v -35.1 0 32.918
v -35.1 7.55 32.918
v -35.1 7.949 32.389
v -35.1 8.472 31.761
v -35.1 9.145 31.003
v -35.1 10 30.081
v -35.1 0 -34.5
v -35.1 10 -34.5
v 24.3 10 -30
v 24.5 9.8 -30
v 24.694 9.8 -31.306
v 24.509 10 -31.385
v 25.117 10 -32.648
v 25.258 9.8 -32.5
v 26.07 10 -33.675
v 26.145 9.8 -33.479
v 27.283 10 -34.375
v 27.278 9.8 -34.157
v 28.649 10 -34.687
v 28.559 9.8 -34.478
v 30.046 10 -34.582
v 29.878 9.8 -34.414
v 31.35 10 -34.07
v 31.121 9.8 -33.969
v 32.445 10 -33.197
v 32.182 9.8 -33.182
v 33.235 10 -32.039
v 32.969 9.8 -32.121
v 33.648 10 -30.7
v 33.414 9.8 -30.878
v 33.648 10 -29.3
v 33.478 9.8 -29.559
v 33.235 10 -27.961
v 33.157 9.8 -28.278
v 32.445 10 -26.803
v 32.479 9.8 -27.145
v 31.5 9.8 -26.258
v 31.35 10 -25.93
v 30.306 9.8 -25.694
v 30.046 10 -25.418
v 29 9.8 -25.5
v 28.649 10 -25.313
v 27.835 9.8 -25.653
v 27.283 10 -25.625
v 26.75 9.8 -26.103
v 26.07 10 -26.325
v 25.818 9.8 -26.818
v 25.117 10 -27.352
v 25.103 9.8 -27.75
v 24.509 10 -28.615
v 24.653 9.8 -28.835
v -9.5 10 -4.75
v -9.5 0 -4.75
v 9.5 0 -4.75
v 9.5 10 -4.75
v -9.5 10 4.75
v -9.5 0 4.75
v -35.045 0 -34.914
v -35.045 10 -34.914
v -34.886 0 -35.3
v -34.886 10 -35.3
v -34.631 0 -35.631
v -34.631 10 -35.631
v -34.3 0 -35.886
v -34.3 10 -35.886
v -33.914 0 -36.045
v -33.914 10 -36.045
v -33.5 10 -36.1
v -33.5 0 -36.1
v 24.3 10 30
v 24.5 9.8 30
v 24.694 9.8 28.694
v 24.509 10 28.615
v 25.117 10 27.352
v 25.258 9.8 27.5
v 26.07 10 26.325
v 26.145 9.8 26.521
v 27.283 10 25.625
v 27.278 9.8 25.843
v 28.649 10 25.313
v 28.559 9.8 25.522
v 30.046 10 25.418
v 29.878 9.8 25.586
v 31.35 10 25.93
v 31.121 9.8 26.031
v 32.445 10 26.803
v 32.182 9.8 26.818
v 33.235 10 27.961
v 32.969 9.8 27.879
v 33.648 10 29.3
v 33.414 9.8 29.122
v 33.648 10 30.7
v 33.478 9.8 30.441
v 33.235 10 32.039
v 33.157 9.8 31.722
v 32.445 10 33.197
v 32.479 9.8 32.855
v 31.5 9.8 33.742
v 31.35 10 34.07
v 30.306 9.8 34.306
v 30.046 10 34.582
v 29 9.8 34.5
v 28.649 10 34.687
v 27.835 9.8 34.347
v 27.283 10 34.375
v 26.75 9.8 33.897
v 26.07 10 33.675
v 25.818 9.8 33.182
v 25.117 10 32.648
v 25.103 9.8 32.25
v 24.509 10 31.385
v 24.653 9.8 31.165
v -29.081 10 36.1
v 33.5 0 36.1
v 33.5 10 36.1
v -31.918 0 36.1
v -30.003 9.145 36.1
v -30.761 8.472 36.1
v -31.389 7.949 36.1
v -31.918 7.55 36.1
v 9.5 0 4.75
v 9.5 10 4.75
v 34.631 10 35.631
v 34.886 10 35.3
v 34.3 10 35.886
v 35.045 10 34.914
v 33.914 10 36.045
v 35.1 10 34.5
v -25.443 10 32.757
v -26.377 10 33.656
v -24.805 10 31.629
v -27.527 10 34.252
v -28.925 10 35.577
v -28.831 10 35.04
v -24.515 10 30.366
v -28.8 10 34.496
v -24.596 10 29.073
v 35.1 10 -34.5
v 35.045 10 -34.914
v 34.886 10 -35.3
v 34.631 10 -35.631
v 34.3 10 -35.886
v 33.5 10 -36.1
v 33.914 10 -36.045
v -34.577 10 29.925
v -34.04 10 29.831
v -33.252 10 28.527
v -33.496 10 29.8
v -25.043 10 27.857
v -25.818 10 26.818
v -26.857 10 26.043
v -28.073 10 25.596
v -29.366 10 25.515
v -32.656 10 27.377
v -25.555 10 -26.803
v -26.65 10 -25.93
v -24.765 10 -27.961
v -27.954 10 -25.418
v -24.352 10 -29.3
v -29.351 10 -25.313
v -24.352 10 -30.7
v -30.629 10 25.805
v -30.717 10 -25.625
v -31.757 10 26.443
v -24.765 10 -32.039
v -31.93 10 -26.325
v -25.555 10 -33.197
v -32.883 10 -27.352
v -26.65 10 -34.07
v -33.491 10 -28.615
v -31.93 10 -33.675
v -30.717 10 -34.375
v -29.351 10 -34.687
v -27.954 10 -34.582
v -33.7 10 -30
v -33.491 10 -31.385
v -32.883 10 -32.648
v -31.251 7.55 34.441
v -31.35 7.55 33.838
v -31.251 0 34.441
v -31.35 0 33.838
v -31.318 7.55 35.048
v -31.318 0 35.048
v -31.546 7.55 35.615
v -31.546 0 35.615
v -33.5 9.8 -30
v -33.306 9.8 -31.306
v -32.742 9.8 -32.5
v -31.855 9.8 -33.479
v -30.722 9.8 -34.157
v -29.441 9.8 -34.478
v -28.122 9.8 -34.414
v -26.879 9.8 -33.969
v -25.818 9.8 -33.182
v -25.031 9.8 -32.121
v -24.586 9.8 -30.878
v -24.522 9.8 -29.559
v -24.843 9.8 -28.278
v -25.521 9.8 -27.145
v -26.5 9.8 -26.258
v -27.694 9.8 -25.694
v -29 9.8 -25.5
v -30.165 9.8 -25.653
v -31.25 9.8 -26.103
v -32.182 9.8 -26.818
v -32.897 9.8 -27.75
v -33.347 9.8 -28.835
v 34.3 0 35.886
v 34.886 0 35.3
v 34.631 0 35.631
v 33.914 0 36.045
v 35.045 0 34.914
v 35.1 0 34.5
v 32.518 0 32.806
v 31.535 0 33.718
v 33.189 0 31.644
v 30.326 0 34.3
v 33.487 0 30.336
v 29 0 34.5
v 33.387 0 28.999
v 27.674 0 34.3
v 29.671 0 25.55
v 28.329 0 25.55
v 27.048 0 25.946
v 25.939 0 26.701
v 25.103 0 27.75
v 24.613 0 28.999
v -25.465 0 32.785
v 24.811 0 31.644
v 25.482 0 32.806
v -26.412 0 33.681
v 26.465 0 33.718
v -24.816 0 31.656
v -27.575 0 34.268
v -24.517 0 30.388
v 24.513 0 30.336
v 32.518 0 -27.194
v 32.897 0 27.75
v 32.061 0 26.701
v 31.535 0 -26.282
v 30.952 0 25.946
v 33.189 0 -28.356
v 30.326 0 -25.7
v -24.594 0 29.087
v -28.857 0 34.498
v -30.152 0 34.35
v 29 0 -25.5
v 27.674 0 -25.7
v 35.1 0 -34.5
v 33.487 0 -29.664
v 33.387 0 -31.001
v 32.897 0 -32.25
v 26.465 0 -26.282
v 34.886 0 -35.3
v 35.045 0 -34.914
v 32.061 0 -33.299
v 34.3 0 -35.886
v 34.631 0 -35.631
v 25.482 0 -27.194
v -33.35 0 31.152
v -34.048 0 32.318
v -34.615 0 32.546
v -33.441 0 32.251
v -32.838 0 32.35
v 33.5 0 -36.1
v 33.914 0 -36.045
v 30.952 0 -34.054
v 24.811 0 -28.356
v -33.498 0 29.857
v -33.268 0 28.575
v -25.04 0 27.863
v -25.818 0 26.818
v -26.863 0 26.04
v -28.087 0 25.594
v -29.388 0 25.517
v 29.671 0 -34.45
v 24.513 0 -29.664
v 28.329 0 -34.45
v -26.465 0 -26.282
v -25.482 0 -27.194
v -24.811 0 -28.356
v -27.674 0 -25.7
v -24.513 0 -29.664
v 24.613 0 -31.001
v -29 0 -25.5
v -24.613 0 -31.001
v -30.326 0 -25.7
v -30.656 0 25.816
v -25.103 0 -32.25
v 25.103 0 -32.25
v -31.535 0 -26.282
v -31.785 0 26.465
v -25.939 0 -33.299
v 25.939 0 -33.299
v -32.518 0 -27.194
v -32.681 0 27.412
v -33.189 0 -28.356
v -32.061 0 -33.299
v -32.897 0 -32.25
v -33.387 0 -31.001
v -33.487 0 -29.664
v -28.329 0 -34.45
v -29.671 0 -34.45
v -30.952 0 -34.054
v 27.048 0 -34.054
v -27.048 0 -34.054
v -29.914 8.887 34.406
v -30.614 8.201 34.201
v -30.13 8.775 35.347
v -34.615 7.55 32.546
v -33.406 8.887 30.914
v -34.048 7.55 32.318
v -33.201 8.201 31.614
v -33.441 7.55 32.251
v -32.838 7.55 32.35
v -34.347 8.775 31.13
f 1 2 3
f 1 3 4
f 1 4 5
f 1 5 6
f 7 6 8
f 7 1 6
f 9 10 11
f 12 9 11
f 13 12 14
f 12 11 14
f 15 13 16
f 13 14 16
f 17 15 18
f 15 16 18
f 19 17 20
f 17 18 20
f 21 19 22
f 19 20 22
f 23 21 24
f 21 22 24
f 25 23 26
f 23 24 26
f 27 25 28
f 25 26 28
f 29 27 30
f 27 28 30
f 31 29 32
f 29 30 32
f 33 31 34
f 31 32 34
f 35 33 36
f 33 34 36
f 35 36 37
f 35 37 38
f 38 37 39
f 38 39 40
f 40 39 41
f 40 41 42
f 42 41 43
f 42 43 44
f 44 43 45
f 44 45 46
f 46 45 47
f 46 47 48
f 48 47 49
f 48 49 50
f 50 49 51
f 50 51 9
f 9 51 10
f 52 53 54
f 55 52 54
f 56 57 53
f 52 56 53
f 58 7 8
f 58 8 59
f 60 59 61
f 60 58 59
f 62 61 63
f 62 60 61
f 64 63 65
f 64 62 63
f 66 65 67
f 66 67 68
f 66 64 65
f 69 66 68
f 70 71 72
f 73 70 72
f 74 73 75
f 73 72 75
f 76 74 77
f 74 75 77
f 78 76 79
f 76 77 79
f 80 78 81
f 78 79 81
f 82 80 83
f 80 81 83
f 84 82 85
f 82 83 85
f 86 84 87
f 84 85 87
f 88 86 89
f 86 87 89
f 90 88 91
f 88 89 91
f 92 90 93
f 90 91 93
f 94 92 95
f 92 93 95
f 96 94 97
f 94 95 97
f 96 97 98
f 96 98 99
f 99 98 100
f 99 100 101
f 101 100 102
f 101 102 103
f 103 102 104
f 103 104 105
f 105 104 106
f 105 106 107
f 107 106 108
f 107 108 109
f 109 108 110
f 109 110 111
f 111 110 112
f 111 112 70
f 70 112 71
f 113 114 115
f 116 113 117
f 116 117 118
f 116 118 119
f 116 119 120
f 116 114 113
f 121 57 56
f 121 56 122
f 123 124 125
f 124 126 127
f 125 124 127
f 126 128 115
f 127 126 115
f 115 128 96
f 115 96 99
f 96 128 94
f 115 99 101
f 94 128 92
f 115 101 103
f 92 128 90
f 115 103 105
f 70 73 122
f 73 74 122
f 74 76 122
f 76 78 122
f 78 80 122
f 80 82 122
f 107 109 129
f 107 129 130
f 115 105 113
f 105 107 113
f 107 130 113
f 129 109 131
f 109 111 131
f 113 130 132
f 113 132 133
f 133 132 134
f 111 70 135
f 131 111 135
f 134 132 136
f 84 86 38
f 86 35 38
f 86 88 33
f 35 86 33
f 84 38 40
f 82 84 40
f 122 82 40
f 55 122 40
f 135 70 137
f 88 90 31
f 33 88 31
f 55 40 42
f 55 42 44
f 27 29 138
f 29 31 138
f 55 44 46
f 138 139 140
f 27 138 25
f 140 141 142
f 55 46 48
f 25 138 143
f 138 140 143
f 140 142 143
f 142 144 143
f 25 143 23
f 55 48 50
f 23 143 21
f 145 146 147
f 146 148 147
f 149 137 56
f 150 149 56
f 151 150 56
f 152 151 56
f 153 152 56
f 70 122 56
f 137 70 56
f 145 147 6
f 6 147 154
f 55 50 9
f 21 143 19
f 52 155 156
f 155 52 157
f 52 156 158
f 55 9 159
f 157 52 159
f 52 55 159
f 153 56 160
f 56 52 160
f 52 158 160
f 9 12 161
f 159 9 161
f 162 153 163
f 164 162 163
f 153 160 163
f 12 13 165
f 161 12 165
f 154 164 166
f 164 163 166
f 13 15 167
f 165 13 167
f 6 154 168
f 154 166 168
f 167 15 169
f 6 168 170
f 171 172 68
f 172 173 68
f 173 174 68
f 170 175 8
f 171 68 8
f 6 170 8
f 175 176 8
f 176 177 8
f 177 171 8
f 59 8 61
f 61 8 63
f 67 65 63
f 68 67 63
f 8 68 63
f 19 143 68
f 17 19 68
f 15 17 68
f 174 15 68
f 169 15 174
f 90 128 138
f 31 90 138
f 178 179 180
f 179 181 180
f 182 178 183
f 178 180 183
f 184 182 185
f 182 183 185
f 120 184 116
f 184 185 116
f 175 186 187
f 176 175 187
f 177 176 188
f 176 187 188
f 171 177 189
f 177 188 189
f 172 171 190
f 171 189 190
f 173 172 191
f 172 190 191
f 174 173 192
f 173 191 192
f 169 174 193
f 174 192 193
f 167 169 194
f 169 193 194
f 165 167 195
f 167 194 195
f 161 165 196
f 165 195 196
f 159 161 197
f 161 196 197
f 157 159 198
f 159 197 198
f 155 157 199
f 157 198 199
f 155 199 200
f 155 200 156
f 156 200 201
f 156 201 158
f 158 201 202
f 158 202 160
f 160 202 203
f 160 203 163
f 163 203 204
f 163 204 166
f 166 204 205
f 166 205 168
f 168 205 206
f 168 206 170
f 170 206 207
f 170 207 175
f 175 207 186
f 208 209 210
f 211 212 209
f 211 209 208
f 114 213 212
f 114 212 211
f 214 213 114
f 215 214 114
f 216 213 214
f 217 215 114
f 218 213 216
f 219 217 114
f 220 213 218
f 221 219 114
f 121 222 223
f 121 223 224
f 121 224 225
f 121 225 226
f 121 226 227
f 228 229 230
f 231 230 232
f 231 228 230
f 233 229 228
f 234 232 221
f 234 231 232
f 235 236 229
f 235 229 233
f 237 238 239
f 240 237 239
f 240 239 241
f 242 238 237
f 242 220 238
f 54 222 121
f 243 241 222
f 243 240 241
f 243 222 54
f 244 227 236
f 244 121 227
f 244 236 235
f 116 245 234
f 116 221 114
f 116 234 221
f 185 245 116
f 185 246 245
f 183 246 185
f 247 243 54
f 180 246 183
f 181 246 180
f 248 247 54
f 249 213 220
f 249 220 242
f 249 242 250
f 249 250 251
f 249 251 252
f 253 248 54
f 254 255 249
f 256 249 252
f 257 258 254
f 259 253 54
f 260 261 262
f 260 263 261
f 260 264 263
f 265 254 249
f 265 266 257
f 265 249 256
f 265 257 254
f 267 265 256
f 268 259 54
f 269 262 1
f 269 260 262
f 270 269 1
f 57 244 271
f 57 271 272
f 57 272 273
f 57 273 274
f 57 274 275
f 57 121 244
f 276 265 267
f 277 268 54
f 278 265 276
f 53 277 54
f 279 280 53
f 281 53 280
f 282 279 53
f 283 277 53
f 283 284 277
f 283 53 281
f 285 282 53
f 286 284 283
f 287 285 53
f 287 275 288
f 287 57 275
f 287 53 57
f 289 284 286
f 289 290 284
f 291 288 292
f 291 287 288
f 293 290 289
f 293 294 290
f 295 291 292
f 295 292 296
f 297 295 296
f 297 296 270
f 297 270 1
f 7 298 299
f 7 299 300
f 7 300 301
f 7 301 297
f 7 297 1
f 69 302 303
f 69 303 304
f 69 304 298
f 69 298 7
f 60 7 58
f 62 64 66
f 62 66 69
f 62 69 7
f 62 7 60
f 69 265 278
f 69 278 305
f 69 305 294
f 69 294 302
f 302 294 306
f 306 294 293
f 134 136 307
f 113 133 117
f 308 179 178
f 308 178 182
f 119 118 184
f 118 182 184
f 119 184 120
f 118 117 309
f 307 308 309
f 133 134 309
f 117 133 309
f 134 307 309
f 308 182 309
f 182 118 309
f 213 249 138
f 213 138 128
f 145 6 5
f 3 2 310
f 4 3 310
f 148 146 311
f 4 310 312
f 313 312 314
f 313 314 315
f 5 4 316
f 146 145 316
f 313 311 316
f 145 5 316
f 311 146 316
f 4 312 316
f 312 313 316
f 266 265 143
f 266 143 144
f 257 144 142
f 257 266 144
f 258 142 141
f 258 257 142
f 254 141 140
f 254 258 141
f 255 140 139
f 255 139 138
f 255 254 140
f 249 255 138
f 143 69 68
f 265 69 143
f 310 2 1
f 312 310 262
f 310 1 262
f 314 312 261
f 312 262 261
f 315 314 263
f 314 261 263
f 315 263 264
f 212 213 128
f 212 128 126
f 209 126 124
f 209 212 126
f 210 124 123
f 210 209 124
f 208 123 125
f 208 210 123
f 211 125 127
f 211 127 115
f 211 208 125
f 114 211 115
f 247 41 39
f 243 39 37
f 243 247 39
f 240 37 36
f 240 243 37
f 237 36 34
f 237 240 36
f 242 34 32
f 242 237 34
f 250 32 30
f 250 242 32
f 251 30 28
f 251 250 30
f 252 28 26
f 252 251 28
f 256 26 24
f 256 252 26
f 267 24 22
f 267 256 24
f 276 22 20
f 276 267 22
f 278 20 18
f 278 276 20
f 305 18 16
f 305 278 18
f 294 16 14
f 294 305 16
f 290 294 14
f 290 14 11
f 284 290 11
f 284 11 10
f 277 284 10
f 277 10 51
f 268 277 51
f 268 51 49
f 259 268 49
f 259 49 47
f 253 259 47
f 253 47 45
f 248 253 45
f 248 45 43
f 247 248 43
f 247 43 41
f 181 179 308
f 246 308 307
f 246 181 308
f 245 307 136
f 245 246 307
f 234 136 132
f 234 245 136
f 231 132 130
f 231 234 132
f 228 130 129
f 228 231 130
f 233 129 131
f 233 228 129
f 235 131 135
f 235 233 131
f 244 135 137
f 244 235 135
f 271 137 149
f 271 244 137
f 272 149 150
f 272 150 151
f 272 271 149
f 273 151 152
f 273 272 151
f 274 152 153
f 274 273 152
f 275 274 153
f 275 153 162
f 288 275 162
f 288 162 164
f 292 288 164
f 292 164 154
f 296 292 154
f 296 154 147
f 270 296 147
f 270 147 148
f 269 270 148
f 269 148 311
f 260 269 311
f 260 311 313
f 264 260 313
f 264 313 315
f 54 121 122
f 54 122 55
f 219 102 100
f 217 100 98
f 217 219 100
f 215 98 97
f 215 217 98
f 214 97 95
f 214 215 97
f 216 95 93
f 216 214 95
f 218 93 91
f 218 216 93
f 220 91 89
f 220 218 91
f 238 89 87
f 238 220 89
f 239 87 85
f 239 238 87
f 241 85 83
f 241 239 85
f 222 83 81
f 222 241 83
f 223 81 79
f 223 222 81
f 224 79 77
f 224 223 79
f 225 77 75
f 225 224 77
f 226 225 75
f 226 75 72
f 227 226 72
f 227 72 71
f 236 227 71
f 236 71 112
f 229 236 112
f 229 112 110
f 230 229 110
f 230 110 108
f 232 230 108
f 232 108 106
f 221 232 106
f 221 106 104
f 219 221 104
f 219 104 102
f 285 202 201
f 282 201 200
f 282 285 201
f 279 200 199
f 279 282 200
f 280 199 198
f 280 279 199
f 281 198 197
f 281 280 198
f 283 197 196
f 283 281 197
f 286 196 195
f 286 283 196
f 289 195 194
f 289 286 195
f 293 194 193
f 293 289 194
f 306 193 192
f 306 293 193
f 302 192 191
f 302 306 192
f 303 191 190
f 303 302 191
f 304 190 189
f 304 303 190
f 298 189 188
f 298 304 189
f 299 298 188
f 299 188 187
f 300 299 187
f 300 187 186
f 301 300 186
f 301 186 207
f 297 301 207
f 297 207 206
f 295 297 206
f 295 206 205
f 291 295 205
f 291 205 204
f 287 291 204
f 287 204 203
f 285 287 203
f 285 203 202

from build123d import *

# Parameters (mm, degrees)
SKETCH_2_R                  = 4.5
SKETCH_2_W                  = 19
SKETCH_2_H                  = 9.5
EXTRUDE_1_DEPTH             = 10
HOLE_WIZARD_M41_D           = 4.5
HOLE_WIZARD_M41_CSINK_D     = 9.4
HOLE_WIZARD_M41_CSINK_ANGLE = 90


with BuildPart() as part:
    # Эскиз2 → Бобышка-Вытянуть1 (new body)
    with BuildSketch(Plane(origin=(0, 0, 0), x_dir=(1, 0, 0), z_dir=(0, 1, 0))):
        with BuildLine():
            Line((33.5, -36.1), (-33.5, -36.1))
            ThreePointArc((-33.5, -36.1), (-34.63137085, -35.63137085), (-35.1, -34.5))
            Line((-35.1, -34.5), (-35.1, 34.5))
            ThreePointArc((-35.1, 34.5), (-34.63137085, 35.63137085), (-33.5, 36.1))
            Line((-33.5, 36.1), (33.5, 36.1))
            ThreePointArc((33.5, 36.1), (34.63137085, 35.63137085), (35.1, 34.5))
            Line((35.1, 34.5), (35.1, -34.5))
            ThreePointArc((35.1, -34.5), (34.63137085, -35.63137085), (33.5, -36.1))
        make_face()
        with Locations(Location((-29, 30, 0), (0, 0, 270))):
            Circle(SKETCH_2_R, mode=Mode.SUBTRACT)
        with Locations(Location((29, 30, 0), (0, 0, 270))):
            Circle(SKETCH_2_R, mode=Mode.SUBTRACT)
        with Locations(Location((29, -30, 0), (0, 0, 270))):
            Circle(SKETCH_2_R, mode=Mode.SUBTRACT)
        with Locations(Location((-29, -30, 0), (0, 0, 270))):
            Circle(SKETCH_2_R, mode=Mode.SUBTRACT)
        Rectangle(SKETCH_2_W, SKETCH_2_H, mode=Mode.SUBTRACT)
    extrude(amount=EXTRUDE_1_DEPTH)

    # Зенковка для винта с полупотайной головкой M41 (through all)
    with Locations(Plane(origin=(0, 10, 0), x_dir=(1, 0, 0), z_dir=(0, 1, 0))):
        with Locations((-29, 30), (29, 30), (-33.5, -34.5), (29, -30)):
            CounterSinkHole(HOLE_WIZARD_M41_D / 2, HOLE_WIZARD_M41_CSINK_D / 2, counter_sink_angle=HOLE_WIZARD_M41_CSINK_ANGLE)


solid = part.part
